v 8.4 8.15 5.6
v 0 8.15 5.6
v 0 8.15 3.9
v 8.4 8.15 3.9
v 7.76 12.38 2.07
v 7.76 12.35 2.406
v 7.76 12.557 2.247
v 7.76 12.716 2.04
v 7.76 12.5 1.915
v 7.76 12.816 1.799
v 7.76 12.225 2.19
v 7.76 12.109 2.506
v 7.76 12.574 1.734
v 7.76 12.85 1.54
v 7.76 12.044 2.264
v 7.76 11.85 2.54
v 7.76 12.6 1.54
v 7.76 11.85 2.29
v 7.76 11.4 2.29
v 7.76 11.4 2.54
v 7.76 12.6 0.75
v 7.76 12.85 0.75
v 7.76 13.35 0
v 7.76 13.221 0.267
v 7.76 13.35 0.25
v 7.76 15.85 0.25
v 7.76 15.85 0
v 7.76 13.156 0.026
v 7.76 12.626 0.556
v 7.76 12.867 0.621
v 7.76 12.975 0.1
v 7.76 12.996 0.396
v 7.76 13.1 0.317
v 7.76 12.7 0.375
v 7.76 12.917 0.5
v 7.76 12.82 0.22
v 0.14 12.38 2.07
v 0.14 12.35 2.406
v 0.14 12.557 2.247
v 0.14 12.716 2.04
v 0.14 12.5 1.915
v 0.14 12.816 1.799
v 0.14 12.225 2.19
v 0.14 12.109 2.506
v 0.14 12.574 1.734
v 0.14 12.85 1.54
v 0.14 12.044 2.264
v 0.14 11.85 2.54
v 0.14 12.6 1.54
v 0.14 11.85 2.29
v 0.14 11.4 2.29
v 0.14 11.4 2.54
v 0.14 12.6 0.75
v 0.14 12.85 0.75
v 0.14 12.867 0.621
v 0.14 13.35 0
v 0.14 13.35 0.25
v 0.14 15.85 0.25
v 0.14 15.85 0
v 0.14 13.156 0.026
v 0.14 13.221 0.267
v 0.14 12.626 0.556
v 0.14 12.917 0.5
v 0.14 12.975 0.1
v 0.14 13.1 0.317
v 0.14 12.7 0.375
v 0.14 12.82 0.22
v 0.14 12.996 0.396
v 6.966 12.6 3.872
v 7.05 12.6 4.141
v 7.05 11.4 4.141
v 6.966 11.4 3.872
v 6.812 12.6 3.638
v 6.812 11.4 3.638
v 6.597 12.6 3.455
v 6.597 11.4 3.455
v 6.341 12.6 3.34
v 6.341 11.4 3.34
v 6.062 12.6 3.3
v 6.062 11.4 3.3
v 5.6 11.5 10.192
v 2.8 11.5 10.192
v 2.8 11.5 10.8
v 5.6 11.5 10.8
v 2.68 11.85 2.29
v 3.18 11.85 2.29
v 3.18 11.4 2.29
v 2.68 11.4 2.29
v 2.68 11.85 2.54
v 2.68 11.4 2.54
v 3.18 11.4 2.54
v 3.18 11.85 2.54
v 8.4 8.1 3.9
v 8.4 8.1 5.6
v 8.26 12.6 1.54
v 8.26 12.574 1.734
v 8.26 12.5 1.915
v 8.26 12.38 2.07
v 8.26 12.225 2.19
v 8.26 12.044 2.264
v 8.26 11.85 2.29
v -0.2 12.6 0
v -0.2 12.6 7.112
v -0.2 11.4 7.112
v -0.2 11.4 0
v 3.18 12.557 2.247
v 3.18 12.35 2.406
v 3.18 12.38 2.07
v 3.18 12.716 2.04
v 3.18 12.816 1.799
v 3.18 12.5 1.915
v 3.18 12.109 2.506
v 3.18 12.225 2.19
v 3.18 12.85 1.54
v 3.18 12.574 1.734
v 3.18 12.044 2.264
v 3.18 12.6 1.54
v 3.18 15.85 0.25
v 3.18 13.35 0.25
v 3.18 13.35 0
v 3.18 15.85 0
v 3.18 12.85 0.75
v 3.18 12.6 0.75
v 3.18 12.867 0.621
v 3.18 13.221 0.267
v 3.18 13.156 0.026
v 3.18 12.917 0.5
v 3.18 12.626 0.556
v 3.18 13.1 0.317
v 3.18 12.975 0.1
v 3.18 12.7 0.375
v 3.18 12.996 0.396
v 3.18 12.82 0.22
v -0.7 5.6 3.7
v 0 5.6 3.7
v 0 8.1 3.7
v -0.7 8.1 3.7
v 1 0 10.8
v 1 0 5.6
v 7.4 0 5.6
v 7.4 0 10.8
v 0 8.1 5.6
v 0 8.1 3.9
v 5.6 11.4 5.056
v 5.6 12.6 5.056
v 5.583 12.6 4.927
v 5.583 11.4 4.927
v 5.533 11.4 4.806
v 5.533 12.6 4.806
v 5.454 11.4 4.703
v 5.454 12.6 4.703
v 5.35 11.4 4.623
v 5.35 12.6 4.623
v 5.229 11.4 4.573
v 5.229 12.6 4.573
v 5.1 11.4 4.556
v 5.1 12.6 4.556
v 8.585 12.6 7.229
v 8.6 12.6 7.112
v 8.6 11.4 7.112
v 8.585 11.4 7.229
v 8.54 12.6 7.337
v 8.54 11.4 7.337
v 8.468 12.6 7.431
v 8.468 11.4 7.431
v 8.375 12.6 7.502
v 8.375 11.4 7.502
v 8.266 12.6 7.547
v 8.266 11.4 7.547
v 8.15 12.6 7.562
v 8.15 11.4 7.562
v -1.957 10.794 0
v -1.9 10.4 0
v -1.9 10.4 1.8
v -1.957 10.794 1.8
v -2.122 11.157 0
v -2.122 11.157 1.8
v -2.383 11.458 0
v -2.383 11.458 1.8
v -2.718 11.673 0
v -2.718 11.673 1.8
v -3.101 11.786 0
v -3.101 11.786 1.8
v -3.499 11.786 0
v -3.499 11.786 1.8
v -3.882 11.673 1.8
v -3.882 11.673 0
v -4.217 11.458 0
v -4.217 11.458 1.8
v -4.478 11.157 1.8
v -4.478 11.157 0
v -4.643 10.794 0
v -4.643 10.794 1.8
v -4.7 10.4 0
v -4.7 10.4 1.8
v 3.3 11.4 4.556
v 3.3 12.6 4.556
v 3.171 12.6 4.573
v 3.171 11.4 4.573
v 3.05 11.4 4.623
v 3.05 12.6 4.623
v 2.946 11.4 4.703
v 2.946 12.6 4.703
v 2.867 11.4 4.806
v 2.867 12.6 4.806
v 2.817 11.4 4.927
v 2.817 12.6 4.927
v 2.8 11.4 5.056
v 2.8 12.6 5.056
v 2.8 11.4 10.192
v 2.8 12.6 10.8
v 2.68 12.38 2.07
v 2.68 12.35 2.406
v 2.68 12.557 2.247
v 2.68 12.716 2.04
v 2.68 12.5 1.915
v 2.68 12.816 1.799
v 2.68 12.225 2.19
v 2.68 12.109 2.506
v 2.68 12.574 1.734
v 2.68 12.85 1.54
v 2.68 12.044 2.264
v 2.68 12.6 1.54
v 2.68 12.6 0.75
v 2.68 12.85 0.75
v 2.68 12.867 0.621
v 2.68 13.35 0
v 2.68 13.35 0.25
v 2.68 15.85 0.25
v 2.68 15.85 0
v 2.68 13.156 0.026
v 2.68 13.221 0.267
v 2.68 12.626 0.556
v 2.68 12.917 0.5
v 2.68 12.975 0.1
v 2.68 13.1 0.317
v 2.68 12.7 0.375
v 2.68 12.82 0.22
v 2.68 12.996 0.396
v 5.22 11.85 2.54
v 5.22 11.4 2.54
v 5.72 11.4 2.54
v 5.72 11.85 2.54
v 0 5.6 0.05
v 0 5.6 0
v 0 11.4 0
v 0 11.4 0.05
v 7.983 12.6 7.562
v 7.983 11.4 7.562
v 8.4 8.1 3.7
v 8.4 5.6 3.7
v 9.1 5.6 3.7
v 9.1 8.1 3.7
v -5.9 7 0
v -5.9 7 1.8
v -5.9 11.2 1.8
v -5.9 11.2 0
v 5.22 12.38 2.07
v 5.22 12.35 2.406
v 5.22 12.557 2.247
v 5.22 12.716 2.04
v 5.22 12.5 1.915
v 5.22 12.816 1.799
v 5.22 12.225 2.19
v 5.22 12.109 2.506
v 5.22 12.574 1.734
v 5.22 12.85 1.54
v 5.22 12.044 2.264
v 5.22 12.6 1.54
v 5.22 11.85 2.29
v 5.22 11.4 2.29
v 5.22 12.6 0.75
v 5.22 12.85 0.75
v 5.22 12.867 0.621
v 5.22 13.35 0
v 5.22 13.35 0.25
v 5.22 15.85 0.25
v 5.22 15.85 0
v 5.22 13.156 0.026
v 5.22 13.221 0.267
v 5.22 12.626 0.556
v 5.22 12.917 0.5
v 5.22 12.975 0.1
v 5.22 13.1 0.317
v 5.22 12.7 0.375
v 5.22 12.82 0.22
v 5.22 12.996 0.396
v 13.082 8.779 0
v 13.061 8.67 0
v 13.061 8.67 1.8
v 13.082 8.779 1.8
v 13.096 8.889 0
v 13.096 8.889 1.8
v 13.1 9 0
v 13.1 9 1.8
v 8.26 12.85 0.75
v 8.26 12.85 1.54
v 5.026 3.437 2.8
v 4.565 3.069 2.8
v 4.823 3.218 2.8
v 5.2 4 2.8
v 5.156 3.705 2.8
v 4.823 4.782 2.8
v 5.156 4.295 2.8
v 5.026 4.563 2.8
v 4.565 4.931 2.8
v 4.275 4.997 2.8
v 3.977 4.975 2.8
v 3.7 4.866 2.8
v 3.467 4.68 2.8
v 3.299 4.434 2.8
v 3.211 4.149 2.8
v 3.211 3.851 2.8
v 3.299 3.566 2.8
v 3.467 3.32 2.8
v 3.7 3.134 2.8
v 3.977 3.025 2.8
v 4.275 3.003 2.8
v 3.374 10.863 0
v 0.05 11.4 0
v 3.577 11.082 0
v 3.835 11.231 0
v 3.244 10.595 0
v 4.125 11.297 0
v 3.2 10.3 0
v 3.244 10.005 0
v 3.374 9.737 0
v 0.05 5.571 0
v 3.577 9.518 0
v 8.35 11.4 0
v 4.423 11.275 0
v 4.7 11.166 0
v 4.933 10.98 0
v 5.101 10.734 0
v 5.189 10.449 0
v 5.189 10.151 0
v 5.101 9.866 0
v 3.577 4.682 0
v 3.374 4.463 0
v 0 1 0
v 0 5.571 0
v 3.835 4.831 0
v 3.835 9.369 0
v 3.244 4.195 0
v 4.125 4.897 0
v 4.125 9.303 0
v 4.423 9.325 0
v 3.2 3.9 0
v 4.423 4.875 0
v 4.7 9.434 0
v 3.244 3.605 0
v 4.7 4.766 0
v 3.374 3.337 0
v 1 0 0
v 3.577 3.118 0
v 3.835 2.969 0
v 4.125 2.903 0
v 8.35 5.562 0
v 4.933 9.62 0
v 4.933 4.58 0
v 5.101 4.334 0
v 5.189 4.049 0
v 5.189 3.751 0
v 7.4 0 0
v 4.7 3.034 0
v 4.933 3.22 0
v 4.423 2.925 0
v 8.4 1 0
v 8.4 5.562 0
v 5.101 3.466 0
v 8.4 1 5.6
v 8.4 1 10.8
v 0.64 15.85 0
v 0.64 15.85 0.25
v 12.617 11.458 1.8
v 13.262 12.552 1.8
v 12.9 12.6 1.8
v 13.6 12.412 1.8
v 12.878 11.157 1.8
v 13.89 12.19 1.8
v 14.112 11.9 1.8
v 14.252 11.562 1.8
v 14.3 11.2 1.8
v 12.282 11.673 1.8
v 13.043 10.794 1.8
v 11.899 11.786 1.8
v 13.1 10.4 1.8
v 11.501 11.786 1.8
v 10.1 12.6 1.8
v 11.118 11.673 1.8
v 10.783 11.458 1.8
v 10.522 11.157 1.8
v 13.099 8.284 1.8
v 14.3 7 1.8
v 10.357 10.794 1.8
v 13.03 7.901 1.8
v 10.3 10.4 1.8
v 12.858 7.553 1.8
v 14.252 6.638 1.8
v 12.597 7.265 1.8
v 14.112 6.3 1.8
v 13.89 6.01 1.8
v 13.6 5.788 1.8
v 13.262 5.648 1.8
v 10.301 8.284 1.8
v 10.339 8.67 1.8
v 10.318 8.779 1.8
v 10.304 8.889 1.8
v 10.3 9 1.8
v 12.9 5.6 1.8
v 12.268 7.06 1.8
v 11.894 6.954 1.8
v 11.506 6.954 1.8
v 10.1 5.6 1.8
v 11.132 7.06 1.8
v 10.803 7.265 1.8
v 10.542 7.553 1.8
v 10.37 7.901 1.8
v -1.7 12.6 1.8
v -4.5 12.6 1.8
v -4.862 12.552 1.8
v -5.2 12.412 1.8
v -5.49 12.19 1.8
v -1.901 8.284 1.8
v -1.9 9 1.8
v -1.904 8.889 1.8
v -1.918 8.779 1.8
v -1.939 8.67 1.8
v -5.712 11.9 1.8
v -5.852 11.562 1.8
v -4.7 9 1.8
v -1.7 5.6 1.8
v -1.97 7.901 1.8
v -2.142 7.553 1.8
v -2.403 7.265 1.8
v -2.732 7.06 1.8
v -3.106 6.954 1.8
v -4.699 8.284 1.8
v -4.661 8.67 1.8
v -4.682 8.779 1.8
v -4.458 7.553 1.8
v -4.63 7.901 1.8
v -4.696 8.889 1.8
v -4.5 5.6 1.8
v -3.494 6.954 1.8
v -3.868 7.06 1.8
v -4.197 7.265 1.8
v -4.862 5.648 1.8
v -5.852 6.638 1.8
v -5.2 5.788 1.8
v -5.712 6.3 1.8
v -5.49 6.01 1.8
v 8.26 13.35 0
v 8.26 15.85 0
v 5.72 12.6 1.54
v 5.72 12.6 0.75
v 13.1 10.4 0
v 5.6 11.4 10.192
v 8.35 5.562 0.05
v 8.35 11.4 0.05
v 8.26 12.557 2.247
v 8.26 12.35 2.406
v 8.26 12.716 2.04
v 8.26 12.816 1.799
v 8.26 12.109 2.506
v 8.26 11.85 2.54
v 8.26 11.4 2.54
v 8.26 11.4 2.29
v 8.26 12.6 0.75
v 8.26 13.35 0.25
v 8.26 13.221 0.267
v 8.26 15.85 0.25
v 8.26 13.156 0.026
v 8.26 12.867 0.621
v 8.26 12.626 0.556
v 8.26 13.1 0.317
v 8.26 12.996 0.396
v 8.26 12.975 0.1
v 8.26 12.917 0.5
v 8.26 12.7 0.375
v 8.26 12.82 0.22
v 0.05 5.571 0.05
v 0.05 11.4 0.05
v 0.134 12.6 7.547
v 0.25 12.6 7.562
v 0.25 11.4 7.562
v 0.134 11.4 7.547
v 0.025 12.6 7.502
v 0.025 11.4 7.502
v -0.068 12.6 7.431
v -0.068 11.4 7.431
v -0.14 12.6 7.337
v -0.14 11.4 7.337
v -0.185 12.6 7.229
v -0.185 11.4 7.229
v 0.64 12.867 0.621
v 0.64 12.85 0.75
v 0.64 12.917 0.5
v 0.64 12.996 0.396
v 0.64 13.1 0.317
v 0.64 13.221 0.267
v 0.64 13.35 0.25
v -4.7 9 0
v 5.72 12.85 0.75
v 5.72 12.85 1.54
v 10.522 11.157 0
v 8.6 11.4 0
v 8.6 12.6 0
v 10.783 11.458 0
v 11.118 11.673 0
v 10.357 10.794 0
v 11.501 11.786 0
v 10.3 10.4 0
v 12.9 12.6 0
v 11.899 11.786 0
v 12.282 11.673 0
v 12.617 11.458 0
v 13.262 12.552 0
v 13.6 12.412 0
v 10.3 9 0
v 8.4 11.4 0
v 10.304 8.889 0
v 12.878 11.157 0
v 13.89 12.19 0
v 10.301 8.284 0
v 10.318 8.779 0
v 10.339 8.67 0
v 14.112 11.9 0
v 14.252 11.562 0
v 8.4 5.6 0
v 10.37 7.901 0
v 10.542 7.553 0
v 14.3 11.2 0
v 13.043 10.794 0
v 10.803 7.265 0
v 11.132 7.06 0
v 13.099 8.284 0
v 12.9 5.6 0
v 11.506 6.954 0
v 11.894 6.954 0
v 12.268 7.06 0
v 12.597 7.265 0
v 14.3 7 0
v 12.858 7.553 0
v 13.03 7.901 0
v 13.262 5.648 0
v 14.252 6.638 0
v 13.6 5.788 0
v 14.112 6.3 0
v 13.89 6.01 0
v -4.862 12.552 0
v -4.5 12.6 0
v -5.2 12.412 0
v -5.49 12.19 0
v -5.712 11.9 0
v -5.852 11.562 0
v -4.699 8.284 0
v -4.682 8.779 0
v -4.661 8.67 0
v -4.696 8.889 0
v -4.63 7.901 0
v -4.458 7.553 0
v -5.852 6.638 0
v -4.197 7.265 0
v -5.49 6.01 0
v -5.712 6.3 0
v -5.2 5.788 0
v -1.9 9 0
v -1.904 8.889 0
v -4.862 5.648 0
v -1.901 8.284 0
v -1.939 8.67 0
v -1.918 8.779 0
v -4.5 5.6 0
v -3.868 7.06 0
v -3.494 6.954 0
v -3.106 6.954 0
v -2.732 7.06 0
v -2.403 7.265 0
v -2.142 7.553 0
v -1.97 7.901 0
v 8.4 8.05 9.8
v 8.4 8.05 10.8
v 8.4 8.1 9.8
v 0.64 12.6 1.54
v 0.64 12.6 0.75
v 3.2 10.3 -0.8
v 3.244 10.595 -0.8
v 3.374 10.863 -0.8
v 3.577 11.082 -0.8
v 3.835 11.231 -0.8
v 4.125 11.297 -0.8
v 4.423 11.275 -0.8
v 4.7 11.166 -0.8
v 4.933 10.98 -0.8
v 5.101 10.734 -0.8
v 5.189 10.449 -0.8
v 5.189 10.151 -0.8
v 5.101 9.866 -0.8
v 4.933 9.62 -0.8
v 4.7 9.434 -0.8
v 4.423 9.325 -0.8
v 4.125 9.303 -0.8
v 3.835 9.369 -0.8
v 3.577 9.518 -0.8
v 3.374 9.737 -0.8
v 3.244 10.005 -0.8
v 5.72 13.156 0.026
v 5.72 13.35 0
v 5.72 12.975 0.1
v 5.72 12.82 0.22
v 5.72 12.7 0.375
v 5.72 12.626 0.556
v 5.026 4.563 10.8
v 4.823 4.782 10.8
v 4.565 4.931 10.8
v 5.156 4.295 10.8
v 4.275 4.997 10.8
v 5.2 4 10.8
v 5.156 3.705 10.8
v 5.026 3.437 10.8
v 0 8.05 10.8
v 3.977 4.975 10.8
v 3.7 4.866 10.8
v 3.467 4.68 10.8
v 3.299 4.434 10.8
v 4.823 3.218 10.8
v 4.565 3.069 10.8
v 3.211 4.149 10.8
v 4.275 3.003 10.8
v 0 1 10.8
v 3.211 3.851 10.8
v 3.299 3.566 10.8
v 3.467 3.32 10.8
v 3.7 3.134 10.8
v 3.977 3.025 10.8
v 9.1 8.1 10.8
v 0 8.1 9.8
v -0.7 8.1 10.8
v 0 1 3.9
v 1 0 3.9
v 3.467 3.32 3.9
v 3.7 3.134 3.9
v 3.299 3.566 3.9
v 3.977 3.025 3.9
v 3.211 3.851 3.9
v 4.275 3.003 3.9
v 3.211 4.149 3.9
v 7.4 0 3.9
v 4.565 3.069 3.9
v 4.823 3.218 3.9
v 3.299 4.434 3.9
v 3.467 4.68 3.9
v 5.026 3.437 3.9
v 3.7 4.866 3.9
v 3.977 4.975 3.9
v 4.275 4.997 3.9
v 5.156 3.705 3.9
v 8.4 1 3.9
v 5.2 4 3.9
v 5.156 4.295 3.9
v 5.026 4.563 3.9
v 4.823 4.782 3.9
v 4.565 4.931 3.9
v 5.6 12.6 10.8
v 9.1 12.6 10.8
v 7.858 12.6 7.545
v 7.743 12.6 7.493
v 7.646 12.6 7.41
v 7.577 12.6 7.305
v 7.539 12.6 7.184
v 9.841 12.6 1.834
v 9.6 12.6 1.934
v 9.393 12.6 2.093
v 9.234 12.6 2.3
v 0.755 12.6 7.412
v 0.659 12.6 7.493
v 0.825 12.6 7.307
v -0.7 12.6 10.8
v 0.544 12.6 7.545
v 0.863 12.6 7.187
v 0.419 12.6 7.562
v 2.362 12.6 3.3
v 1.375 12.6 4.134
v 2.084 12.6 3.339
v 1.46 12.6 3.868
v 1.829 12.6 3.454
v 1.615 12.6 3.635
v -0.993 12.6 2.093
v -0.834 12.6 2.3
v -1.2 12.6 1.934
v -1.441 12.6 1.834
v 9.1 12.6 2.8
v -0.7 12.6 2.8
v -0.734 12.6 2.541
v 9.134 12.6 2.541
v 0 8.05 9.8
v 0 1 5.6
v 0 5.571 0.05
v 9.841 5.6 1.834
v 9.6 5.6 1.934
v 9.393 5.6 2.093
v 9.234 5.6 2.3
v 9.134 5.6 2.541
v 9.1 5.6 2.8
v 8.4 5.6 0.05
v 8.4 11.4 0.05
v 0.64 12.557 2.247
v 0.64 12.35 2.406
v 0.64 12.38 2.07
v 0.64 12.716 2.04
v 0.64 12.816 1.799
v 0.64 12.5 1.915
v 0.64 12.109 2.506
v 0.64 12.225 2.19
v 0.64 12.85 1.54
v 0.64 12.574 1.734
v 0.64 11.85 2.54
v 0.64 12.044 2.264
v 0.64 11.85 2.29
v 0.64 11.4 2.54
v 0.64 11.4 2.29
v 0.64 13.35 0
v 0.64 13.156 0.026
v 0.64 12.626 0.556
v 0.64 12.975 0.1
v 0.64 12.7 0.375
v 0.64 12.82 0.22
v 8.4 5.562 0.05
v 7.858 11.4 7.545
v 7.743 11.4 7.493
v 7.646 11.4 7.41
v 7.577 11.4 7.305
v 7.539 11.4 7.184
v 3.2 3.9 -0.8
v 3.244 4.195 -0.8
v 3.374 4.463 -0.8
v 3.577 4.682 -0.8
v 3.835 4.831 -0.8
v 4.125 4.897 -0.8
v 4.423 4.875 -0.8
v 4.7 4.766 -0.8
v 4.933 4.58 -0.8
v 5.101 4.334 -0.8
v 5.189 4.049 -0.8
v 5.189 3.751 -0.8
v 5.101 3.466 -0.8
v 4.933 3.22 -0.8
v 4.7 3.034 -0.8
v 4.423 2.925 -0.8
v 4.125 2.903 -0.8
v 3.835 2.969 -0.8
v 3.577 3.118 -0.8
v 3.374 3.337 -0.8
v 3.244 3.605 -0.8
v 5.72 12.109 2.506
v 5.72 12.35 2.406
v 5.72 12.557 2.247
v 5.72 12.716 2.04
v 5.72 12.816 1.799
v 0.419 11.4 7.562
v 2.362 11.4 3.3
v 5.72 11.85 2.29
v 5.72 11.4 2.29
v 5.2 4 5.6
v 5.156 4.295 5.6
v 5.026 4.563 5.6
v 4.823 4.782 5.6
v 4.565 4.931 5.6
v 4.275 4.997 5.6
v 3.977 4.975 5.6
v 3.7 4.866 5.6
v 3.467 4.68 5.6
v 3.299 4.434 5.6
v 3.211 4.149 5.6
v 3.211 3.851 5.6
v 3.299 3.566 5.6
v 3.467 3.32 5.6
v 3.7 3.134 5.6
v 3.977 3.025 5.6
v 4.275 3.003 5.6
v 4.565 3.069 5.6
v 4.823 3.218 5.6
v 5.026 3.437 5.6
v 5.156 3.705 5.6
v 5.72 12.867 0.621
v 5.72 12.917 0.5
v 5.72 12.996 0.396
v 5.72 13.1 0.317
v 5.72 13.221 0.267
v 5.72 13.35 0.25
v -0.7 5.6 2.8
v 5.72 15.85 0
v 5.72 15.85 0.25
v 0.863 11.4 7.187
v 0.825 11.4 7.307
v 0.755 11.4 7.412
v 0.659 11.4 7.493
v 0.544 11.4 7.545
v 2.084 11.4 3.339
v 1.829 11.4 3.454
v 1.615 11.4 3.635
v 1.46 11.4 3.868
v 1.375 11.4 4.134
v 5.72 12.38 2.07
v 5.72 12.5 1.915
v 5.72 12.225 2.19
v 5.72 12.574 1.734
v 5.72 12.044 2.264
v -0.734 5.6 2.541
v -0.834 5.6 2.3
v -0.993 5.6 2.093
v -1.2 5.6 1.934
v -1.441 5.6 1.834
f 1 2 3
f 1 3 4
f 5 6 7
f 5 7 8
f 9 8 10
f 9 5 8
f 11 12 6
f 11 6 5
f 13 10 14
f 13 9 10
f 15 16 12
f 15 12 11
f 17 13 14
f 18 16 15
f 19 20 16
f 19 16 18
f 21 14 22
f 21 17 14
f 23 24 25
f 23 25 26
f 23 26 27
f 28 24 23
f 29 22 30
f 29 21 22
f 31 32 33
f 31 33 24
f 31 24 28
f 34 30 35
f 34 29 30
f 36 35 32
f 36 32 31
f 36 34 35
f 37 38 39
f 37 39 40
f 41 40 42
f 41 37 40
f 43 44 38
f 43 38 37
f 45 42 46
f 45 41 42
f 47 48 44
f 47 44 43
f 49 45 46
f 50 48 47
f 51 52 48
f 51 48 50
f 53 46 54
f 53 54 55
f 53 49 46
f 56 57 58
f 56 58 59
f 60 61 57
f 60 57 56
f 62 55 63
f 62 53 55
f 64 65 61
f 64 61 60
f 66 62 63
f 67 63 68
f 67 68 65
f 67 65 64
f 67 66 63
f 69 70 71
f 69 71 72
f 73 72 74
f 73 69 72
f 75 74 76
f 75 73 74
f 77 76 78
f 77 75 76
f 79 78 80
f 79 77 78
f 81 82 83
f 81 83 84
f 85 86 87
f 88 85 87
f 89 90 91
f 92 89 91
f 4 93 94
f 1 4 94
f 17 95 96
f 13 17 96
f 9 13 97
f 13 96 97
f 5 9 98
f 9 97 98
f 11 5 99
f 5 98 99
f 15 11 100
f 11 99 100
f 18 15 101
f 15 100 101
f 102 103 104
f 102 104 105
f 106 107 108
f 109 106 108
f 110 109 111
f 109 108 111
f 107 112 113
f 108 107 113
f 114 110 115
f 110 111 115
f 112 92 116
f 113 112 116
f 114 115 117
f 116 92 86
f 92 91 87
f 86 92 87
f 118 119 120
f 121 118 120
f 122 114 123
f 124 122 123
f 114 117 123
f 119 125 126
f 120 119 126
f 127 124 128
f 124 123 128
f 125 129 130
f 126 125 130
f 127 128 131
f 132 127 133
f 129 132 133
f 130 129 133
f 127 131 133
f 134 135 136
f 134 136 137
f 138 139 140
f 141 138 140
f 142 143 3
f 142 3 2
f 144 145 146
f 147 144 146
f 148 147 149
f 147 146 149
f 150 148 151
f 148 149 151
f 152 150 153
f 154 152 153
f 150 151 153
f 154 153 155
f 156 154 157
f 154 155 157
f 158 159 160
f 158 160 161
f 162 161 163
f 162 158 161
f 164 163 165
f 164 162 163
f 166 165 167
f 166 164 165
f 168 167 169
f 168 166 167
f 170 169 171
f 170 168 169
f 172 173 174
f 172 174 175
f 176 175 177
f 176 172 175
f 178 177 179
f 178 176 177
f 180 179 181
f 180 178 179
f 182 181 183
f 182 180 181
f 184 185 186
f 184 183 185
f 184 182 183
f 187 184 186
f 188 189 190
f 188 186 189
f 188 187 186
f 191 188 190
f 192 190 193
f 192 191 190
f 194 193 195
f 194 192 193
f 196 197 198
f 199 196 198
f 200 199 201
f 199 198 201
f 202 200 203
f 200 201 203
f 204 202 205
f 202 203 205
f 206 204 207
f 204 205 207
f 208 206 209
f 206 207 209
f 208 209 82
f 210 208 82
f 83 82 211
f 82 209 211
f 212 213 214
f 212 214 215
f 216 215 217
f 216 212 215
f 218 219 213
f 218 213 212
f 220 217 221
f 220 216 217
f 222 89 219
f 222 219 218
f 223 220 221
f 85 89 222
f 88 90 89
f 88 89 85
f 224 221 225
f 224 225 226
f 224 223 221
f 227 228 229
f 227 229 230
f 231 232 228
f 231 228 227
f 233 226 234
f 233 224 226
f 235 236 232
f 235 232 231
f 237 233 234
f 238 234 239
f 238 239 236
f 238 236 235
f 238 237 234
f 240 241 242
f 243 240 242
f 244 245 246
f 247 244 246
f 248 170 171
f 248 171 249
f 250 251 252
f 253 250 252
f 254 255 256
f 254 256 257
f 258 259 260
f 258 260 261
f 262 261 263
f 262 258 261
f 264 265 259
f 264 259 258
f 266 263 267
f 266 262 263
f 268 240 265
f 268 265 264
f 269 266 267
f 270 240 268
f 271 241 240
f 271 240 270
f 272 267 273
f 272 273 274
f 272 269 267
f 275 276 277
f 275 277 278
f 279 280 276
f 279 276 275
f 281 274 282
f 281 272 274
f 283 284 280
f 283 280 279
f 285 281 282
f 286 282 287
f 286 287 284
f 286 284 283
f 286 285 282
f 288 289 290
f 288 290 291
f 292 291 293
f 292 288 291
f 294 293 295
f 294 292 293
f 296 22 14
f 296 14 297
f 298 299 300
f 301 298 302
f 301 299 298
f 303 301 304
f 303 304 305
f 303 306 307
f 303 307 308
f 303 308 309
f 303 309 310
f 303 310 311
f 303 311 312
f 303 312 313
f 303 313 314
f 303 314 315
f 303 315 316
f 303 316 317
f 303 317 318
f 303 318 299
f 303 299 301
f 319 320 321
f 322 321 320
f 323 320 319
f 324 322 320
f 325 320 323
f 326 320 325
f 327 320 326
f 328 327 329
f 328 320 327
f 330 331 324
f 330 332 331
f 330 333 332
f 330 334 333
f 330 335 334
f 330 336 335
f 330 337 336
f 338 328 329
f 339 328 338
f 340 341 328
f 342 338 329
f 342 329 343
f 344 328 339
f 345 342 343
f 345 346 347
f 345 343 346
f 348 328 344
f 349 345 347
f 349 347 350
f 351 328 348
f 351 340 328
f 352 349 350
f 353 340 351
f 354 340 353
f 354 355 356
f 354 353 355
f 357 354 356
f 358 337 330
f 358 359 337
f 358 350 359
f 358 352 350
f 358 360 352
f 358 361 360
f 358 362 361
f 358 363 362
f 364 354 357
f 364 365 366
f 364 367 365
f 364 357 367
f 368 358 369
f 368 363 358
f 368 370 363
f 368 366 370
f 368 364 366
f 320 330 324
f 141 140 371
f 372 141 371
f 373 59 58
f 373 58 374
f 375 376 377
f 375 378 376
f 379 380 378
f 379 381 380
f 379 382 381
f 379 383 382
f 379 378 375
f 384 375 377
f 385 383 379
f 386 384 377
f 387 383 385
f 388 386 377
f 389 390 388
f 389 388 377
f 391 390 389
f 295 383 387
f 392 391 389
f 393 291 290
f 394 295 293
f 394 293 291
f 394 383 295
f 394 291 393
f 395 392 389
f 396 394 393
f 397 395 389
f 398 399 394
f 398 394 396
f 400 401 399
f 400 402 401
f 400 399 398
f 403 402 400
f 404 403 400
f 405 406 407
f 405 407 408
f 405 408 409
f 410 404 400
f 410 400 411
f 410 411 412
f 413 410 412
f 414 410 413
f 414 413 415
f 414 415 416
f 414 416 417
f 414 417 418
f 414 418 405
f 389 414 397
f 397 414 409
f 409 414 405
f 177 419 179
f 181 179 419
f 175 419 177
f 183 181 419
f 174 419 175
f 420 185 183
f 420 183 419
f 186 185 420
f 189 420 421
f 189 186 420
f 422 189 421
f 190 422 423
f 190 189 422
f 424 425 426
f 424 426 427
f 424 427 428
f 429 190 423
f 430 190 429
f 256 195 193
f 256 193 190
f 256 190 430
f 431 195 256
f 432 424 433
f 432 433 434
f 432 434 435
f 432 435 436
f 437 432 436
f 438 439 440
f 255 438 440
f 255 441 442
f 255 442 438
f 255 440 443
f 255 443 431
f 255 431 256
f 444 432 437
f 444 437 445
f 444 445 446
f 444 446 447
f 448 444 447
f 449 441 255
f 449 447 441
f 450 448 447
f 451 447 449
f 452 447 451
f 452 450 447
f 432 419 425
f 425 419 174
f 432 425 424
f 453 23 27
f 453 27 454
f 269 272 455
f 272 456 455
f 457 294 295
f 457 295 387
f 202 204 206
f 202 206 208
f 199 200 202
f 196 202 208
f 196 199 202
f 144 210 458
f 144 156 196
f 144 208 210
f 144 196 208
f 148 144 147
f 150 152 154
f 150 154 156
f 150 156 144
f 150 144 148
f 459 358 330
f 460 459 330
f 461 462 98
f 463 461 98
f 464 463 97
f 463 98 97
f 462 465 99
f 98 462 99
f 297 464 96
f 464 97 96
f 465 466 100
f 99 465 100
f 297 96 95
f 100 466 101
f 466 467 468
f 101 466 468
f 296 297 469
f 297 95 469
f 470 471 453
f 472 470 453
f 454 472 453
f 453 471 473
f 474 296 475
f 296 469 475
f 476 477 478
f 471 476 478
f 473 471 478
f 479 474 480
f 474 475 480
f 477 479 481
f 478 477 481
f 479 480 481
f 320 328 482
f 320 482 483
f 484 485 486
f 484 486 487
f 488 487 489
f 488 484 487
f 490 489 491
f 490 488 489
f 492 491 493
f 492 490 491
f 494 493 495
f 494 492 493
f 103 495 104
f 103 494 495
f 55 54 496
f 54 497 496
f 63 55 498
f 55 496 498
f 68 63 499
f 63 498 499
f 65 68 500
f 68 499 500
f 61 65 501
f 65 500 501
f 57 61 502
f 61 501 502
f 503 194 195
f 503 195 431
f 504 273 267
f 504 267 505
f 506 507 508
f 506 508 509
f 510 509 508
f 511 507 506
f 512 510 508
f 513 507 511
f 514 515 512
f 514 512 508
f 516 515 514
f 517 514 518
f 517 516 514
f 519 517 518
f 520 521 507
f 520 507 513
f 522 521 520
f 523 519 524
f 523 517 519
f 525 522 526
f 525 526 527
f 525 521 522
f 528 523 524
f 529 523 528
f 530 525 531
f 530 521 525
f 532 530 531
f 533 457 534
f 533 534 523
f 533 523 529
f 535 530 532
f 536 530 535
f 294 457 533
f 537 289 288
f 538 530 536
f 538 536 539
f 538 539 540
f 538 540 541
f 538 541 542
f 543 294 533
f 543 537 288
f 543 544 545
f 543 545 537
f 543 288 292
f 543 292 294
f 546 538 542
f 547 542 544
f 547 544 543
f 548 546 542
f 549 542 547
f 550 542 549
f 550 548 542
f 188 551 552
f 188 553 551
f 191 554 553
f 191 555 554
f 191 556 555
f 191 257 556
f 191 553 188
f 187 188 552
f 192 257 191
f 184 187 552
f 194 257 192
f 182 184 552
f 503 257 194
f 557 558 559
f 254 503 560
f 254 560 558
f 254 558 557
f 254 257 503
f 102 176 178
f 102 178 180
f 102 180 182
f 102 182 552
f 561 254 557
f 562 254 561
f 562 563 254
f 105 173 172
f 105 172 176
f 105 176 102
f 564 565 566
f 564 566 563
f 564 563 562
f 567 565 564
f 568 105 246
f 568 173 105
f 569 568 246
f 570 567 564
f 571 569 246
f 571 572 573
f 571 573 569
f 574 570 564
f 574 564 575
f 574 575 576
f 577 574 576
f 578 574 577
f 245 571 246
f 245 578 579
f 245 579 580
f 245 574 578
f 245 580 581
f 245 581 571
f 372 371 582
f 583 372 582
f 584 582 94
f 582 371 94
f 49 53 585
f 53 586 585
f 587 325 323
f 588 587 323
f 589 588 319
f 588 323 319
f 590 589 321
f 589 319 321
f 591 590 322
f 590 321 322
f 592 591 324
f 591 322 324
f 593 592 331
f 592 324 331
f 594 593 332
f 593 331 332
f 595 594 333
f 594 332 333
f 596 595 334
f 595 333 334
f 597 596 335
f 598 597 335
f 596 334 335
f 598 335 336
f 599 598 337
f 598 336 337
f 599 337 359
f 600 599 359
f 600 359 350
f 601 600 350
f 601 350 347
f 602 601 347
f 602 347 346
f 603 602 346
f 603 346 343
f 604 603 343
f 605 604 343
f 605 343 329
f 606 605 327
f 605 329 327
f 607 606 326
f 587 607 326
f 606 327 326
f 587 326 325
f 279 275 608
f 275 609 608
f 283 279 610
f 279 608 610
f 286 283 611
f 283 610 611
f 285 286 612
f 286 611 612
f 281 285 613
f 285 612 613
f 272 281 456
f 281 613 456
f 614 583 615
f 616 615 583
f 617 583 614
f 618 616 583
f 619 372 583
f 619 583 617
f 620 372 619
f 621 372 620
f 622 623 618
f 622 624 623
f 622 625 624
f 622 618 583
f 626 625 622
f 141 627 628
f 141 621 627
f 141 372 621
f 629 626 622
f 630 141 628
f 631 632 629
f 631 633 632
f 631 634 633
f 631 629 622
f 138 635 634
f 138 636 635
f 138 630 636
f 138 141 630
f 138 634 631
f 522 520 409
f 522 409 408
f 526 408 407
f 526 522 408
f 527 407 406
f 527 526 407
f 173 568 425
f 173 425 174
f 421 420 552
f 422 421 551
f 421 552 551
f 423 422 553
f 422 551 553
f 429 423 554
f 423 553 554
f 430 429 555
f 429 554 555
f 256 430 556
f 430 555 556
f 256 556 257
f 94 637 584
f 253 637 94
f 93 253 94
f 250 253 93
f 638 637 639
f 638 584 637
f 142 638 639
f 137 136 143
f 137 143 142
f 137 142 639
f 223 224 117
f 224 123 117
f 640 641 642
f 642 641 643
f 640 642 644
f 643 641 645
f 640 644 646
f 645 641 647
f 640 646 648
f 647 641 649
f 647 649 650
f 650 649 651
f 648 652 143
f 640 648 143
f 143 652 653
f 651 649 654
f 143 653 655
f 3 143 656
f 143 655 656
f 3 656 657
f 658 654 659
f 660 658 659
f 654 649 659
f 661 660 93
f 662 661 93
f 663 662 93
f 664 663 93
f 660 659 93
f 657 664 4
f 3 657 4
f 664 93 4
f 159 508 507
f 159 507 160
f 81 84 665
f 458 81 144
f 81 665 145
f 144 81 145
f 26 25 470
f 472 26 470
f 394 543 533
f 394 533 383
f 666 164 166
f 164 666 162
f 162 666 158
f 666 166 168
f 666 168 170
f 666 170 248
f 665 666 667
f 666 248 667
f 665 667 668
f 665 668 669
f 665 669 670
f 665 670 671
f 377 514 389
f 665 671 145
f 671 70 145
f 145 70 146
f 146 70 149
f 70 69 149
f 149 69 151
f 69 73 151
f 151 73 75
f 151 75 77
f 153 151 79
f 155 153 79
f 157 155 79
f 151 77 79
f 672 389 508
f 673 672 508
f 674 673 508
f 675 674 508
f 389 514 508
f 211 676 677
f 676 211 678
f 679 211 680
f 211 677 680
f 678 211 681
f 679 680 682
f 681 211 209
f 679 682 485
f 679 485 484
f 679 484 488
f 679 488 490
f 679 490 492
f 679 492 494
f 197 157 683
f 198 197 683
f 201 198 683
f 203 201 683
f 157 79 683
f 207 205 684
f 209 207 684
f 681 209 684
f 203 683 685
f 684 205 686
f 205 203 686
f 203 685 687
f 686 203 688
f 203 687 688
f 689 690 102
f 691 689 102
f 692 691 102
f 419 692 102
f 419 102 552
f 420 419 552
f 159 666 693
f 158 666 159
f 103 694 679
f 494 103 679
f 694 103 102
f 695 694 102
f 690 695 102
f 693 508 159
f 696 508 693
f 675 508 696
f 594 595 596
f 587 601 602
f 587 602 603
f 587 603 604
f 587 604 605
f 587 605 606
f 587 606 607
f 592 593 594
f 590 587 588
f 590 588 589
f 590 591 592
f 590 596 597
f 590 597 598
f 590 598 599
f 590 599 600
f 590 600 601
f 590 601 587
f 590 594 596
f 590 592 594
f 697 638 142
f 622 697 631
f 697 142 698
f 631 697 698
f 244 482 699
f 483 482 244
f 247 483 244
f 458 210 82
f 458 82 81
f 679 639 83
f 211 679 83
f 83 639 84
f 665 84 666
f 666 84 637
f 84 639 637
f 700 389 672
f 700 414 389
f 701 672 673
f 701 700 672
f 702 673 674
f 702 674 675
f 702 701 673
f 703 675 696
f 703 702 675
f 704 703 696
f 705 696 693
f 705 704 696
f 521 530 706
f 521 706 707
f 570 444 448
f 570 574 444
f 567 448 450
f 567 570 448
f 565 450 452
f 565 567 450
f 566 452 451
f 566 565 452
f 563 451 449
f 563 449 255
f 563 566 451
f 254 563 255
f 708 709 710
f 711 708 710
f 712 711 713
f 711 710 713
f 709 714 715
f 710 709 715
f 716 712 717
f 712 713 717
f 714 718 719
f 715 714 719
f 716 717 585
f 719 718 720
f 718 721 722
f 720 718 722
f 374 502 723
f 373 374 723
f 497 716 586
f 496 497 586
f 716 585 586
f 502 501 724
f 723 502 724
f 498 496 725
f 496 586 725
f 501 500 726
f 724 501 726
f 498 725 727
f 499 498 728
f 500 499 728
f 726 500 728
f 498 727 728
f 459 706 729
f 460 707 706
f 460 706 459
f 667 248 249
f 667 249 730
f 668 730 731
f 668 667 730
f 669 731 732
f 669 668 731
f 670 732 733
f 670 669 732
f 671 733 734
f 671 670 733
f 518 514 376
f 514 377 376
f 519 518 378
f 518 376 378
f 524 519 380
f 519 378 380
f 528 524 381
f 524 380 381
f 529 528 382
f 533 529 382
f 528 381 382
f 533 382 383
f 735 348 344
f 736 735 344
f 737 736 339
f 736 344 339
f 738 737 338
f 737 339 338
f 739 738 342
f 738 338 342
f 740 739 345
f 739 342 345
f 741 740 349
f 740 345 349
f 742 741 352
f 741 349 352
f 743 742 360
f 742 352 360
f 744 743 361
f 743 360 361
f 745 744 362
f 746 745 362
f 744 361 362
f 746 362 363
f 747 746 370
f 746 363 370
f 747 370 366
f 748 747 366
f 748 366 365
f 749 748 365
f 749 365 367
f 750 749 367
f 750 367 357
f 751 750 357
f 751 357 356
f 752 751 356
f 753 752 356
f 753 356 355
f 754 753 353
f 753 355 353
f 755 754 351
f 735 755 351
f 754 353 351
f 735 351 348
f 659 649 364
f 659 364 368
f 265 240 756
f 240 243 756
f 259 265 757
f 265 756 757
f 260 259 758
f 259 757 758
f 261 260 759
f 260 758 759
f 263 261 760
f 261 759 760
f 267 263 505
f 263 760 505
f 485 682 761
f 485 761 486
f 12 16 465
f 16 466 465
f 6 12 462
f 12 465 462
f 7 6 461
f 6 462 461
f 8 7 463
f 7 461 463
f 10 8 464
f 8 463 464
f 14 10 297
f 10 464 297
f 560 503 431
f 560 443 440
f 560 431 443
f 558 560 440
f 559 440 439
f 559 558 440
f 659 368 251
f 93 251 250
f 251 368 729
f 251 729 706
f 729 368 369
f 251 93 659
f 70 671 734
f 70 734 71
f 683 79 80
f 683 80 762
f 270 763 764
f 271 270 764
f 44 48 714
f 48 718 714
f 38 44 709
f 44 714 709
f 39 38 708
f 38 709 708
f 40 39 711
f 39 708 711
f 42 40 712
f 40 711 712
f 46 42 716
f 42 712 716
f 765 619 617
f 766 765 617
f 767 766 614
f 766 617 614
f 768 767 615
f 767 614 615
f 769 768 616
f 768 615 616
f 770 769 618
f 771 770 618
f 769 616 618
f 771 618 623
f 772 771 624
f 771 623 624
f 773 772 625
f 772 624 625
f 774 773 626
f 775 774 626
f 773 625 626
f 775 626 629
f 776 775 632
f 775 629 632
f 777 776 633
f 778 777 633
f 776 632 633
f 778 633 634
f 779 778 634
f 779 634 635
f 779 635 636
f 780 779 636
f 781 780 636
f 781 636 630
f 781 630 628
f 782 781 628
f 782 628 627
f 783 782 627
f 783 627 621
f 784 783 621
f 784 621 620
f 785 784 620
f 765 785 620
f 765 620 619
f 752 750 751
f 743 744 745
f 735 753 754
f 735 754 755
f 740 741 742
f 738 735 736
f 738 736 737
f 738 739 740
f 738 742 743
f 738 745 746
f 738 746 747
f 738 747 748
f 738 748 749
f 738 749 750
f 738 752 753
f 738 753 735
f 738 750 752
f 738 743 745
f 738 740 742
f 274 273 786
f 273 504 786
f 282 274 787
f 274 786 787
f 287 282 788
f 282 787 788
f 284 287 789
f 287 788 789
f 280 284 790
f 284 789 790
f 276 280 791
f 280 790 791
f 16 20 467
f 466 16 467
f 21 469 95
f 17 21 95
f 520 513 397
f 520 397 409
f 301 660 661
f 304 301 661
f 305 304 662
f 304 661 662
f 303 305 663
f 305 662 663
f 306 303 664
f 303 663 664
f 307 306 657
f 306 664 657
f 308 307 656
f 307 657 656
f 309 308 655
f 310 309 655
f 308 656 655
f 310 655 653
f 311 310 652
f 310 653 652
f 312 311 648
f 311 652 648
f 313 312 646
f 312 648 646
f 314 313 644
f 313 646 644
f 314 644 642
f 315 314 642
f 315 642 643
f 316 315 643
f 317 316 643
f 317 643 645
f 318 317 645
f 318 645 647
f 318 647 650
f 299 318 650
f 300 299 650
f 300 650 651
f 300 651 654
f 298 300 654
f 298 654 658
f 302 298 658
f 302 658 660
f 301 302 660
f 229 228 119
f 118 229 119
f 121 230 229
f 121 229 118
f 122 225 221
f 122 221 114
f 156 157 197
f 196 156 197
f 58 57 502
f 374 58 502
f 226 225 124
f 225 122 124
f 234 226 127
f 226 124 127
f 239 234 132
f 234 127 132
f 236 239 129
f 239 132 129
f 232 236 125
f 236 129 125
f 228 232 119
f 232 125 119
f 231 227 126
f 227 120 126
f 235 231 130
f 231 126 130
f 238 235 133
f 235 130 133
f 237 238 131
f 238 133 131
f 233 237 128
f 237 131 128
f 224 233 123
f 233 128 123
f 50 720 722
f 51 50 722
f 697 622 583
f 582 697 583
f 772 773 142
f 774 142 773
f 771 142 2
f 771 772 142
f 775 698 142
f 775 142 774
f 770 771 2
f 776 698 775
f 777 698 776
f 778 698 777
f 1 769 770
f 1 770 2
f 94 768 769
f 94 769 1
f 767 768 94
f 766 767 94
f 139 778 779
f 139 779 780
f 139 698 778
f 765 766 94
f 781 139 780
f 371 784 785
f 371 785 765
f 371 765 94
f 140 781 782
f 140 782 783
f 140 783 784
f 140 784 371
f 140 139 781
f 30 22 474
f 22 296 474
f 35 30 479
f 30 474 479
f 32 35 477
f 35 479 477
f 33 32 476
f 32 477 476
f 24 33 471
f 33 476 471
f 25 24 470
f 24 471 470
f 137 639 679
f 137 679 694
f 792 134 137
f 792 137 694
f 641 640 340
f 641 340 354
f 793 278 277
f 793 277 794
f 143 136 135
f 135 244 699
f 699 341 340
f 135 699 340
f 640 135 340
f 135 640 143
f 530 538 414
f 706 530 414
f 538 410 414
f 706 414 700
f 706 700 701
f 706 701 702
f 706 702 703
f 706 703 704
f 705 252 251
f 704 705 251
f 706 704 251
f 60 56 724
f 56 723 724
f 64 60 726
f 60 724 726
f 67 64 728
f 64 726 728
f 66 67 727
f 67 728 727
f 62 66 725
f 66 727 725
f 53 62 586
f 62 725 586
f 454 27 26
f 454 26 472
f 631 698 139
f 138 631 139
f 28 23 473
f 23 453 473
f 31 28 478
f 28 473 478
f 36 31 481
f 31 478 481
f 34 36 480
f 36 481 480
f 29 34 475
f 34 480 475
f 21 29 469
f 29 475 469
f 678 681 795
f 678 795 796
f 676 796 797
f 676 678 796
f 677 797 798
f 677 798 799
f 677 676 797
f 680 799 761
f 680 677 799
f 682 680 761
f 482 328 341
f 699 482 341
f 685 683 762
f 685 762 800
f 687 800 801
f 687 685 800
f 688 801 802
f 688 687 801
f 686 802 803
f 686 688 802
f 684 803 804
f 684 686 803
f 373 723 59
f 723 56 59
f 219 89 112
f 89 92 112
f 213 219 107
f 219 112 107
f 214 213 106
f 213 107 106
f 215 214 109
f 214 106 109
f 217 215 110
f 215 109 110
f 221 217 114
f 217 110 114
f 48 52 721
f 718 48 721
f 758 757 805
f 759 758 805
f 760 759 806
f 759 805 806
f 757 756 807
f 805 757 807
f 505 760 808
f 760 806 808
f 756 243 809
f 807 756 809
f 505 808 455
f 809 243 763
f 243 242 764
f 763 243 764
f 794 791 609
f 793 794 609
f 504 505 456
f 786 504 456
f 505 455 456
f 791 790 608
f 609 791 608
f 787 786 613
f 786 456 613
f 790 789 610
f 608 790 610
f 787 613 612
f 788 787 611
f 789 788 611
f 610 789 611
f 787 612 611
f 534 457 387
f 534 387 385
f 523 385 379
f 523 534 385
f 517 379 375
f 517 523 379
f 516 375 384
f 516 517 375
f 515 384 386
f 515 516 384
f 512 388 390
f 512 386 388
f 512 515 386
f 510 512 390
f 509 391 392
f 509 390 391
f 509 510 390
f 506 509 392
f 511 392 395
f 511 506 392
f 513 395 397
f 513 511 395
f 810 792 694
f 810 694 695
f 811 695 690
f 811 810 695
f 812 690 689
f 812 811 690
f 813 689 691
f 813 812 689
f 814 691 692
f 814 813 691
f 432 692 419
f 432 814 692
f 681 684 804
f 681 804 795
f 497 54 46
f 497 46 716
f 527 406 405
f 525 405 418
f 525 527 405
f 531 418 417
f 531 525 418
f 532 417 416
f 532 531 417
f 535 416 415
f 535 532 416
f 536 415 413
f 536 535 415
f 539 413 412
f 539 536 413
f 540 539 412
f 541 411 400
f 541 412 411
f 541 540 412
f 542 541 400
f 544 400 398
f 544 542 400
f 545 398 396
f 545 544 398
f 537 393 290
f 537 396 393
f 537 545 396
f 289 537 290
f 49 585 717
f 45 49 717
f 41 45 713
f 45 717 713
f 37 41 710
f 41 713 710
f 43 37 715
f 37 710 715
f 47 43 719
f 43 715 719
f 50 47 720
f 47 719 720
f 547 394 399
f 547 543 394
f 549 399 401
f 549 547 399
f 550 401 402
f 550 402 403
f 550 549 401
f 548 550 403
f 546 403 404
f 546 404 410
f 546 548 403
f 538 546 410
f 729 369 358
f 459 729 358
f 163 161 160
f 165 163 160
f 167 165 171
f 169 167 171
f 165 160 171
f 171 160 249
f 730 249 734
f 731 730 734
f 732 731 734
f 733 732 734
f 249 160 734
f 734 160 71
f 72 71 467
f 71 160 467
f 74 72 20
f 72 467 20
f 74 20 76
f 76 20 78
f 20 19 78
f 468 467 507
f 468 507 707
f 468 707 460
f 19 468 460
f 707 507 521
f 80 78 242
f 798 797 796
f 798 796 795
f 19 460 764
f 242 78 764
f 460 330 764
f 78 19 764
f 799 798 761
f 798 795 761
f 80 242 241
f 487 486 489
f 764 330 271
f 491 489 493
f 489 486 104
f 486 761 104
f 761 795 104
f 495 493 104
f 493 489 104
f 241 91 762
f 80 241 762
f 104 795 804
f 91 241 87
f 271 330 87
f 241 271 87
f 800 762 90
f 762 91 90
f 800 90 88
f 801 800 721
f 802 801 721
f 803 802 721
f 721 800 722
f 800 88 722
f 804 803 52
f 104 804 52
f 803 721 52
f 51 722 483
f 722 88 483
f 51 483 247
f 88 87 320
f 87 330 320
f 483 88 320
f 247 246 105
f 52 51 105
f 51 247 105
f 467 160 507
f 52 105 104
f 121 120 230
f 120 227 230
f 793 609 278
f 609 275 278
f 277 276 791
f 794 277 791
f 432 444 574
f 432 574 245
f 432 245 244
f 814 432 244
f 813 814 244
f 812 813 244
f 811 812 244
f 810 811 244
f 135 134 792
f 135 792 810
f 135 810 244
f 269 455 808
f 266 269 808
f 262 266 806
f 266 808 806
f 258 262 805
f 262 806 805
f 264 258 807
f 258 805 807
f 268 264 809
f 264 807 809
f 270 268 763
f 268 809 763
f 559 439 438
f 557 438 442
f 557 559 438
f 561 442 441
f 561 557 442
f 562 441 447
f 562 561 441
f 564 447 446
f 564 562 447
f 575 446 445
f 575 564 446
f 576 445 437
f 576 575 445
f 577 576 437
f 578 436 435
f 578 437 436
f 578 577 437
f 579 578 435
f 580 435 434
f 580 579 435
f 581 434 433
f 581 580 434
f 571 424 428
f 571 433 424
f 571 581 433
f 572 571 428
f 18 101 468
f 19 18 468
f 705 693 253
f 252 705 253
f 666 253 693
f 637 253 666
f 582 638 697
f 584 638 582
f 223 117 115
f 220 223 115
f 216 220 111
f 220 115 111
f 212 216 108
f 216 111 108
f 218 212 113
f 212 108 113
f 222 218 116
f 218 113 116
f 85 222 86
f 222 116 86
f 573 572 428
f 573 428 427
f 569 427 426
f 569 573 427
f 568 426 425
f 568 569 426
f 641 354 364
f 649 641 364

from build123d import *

# Parameters (mm, degrees)
EXTRUDE_1_DEPTH      = 10.8
SKETCH_2_R           = 1
EXTRUDE_2_DEPTH      = 0.8
SKETCH_3_W           = 1.7
SKETCH_3_H           = 8.1
CUT_EXTRUDE_1_DEPTH  = 17.8
EXTRUDE_START        = -4.5
EXTRUDE_3_DEPTH      = 4.5
SKETCH_5_W           = 8.4
SKETCH_5_H           = 0.05
CUT_EXTRUDE_2_DEPTH  = 1
SKETCH_6_R           = 1
CUT_EXTRUDE_3_DEPTH  = 8
CUT_EXTRUDE_4_DEPTH  = 1.2
SKETCH_8_W           = 2.8
SKETCH_8_H           = 0.608363533
EXTRUDE_4_DEPTH      = 0.1
EXTRUDE_START_2      = 2.5
EXTRUDE_5_DEPTH      = 2.5
SKETCH_10_W          = 8.4
SKETCH_10_H          = 1.7
CUT_EXTRUDE_5_DEPTH  = 0.05
FILLET_1_R           = 1.4
SKETCH_11_W          = 0.05
SKETCH_11_H          = 5.83834946
SKETCH_11_H_2        = 5.828769054
CUT_EXTRUDE_8_DEPTH  = 0.05
CUT_EXTRUDE_9_DEPTH  = 4
SKETCH_13_W          = 0.5
SKETCH_13_H          = 5.54
EXTRUDE_6_DEPTH      = 1.45
FILLET_2_R           = 1
CUT_EXTRUDE_START    = -8.12
CUT_EXTRUDE_10_DEPTH = 8.12
SKETCH_15_W          = 3
SKETCH_15_H          = 0.25
CUT_EXTRUDE_11_DEPTH = 8.12
SKETCH_16_W          = 0.5
SKETCH_16_H          = 0.25
EXTRUDE_7_DEPTH      = 3
FILLET_3_R           = 0.5
FILLET_4_R           = 0.75


with BuildPart() as part:
    # Эскиз1 → Бобышка-Вытянуть1 (new body)
    with BuildSketch(Plane.XY):
        Polygon((7.4, 0), (8.4, 1), (8.4, 12.6), (0, 12.6), (0, 1), (1, 0), align=None)
    extrude(amount=EXTRUDE_1_DEPTH)

    # Эскиз2 → Бобышка-Вытянуть2 (add)
    with BuildSketch(Plane(origin=(0, 0, 0), x_dir=(-1, 0, 0), z_dir=(0, 0, -1))):
        with Locations((-4.2, 10.3)):
            Circle(SKETCH_2_R)
        with Locations((-4.2, 3.9)):
            Circle(SKETCH_2_R)
    extrude(amount=EXTRUDE_2_DEPTH)

    # Эскиз3 → Вырез-Вытянуть1 (cut)
    with BuildSketch(Plane(origin=(8.4, 0, 0), x_dir=(0, 0, -1), z_dir=(1, 0, 0))):
        with Locations((-4.75, 4.05)):
            Rectangle(SKETCH_3_W, SKETCH_3_H)
    extrude(amount=-CUT_EXTRUDE_1_DEPTH, mode=Mode.SUBTRACT)

    # Эскиз4 → Бобышка-Вытянуть3 (add)
    with BuildSketch(Plane(origin=(0, 12.6, 0), x_dir=(1, 0, 0), z_dir=(0, 1, 0)).offset(EXTRUDE_START)):
        with BuildLine():
            Line((9.1, -10.8), (-0.7, -10.8))
            Line((-0.7, -10.8), (-0.7, -2.8))
            ThreePointArc((-0.7, -2.8), (-0.992893219, -2.092893219), (-1.7, -1.8))
            Line((-1.7, -1.8), (-5.9, -1.8))
            Line((-5.9, -1.8), (-5.9, 0))
            Line((-5.9, 0), (14.3, 0))
            Line((14.3, 0), (14.3, -1.8))
            Line((14.3, -1.8), (10.1, -1.8))
            ThreePointArc((10.1, -1.8), (9.392893219, -2.092893219), (9.1, -2.8))
            Line((9.1, -2.8), (9.1, -10.8))
        make_face()
    extrude(amount=EXTRUDE_3_DEPTH)

    # Эскиз5 → Вырез-Вытянуть2 (cut)
    with BuildSketch(Plane.XY.offset(10.8)):
        with Locations((4.2, 8.075)):
            Rectangle(SKETCH_5_W, SKETCH_5_H)
    extrude(amount=-CUT_EXTRUDE_2_DEPTH, mode=Mode.SUBTRACT)

    # Эскиз6 → Вырез-Вытянуть3 (cut)
    with BuildSketch(Plane.XY.offset(10.8)):
        with Locations((4.2, 4)):
            Circle(SKETCH_6_R)
    extrude(amount=-CUT_EXTRUDE_3_DEPTH, mode=Mode.SUBTRACT)

    # Эскиз7 → Вырез-Вытянуть4 (cut)
    with BuildSketch(Plane(origin=(0, 12.6, 0), x_dir=(1, 0, 0), z_dir=(0, 1, 0))):
        with BuildLine():
            Line((8.6, 0), (8.6, -7.112411136))
            ThreePointArc((8.6, -7.112411136), (8.468198052, -7.430609188), (8.15, -7.562411136))
            Line((8.15, -7.562411136), (7.983405928, -7.562411136))
            ThreePointArc((7.983405928, -7.562411136), (7.691564003, -7.454943311), (7.539115931, -7.183870205))
            Line((7.539115931, -7.183870205), (7.049736844, -4.141202068))
            ThreePointArc((7.049736844, -4.141202068), (6.710963351, -3.53881739), (6.062425739, -3.3))
            Line((6.062425739, -3.3), (2.361664993, -3.3))
            ThreePointArc((2.361664993, -3.3), (1.71573807, -3.536600753), (1.37546474, -4.13444318))
            Line((1.37546474, -4.13444318), (0.863036378, -7.186911705))
            ThreePointArc((0.863036378, -7.186911705), (0.709913379, -7.455940797), (0.419246264, -7.562411136))
            Line((0.419246264, -7.562411136), (0.25, -7.562411136))
            ThreePointArc((0.25, -7.562411136), (-0.068198052, -7.430609188), (-0.2, -7.112411136))
            Line((-0.2, -7.112411136), (-0.2, 0))
            Line((-0.2, 0), (8.6, 0))
        make_face()
        with BuildLine():
            Line((4.2, -10.8), (5.6, -10.8))
            Line((5.6, -10.8), (5.6, -5.056380156))
            ThreePointArc((5.6, -5.056380156), (5.453553391, -4.702826765), (5.1, -4.556380156))
            Line((5.1, -4.556380156), (3.3, -4.556380156))
            ThreePointArc((3.3, -4.556380156), (2.946446609, -4.702826765), (2.8, -5.056380156))
            Line((2.8, -5.056380156), (2.8, -10.8))
            Line((2.8, -10.8), (4.2, -10.8))
        make_face()
    extrude(amount=-CUT_EXTRUDE_4_DEPTH, mode=Mode.SUBTRACT)

    # Эскиз8 → Бобышка-Вытянуть4 (add)
    with BuildSketch(Plane(origin=(0, 11.4, 0), x_dir=(1, 0, 0), z_dir=(0, 1, 0))):
        with Locations((4.2, -10.495818233)):
            Rectangle(SKETCH_8_W, SKETCH_8_H)
    extrude(amount=EXTRUDE_4_DEPTH)

    # Эскиз9 → Бобышка-Вытянуть5 (add)
    with BuildSketch(Plane.XZ.offset(-8.1).offset(EXTRUDE_START_2)):
        with BuildLine():
            Line((0, 0), (0, 3.7))
            Line((0, 3.7), (-0.7, 3.7))
            Line((-0.7, 3.7), (-0.7, 2.8))
            ThreePointArc((-0.7, 2.8), (-0.992893219, 2.092893219), (-1.7, 1.8))
            Line((-1.7, 1.8), (-5.9, 1.8))
            Line((-5.9, 1.8), (-5.9, 0))
            Line((-5.9, 0), (0, 0))
        make_face()
        with BuildLine():
            Line((14.3, 0), (8.4, 0))
            Line((8.4, 0), (8.4, 3.7))
            Line((8.4, 3.7), (9.1, 3.7))
            Line((9.1, 3.7), (9.1, 2.8))
            ThreePointArc((9.1, 2.8), (9.392893219, 2.092893219), (10.1, 1.8))
            Line((10.1, 1.8), (14.3, 1.8))
            Line((14.3, 1.8), (14.3, 0))
        make_face()
    extrude(amount=-EXTRUDE_5_DEPTH)

    # Эскиз10 → Вырез-Вытянуть5 (cut)
    with BuildSketch(Plane.XZ.offset(-8.1)):
        with Locations((4.2, 4.75)):
            Rectangle(SKETCH_10_W, SKETCH_10_H)
    extrude(amount=-CUT_EXTRUDE_5_DEPTH, mode=Mode.SUBTRACT)

    # Скругление1
    fillet_1_edges = [part.edges().sort_by_distance(p)[0] for p in [
        (-5.9, 5.6, 0.9),
        (14.3, 5.6, 0.9),
        (14.3, 12.6, 0.9),
        (-5.9, 12.6, 0.9),
    ]]
    fillet(fillet_1_edges, radius=FILLET_1_R)

    # Эскиз11 → Вырез-Вытянуть8 (cut)
    with BuildSketch(Plane(origin=(0, 0, 0), x_dir=(-1, 0, 0), z_dir=(0, 0, -1))):
        with Locations((-8.375, 8.48082527)):
            Rectangle(SKETCH_11_W, SKETCH_11_H)
        with Locations((-0.025, 8.485615473)):
            Rectangle(SKETCH_11_W, SKETCH_11_H_2)
    extrude(amount=-CUT_EXTRUDE_8_DEPTH, mode=Mode.SUBTRACT)

    # Эскиз12 → Вырез-Вытянуть9 (cut)
    with BuildSketch(Plane(origin=(0, 0, 0), x_dir=(-1, 0, 0), z_dir=(0, 0, -1))):
        with BuildLine():
            Line((1.9, 9), (1.9, 10.4))
            ThreePointArc((1.9, 10.4), (3.3, 11.8), (4.7, 10.4))
            Line((4.7, 10.4), (4.7, 9))
            ThreePointArc((4.7, 9), (4.690102856, 8.833825246), (4.660551359, 8.67))
            ThreePointArc((4.660551359, 8.67), (3.3, 6.94), (1.939448641, 8.67))
            ThreePointArc((1.939448641, 8.67), (1.909897144, 8.833825246), (1.9, 9))
        make_face()
        with BuildLine():
            Line((-10.3, 10.4), (-10.3, 9))
            ThreePointArc((-10.3, 9), (-10.309897144, 8.833825246), (-10.339448641, 8.67))
            ThreePointArc((-10.339448641, 8.67), (-11.7, 6.94), (-13.060551359, 8.67))
            ThreePointArc((-13.060551359, 8.67), (-13.090102856, 8.833825246), (-13.1, 9))
            Line((-13.1, 9), (-13.1, 10.4))
            ThreePointArc((-13.1, 10.4), (-11.7, 11.8), (-10.3, 10.4))
        make_face()
    extrude(amount=-CUT_EXTRUDE_9_DEPTH, mode=Mode.SUBTRACT)

    # Эскиз13 → Бобышка-Вытянуть6 (add)
    with BuildSketch(Plane(origin=(0, 11.4, 0), x_dir=(1, 0, 0), z_dir=(0, 1, 0))):
        with Locations((5.47, 0.23)):
            Rectangle(SKETCH_13_W, SKETCH_13_H)
        with Locations((8.01, 0.23)):
            Rectangle(SKETCH_13_W, SKETCH_13_H)
        with Locations((2.93, 0.23)):
            Rectangle(SKETCH_13_W, SKETCH_13_H)
        with Locations((0.39, 0.23)):
            Rectangle(SKETCH_13_W, SKETCH_13_H)
    extrude(amount=EXTRUDE_6_DEPTH)

    # Скругление2
    fillet_2_edges = [part.edges().sort_by_distance(p)[0] for p in [
        (5.47, 12.85, 2.54),
        (2.93, 12.85, 2.54),
        (0.39, 12.85, 2.54),
        (8.01, 12.85, 2.54),
    ]]
    fillet(fillet_2_edges, radius=FILLET_2_R)

    # Эскиз14 → Вырез-Вытянуть10 (cut)
    with BuildSketch(Plane.ZY.offset(-0.14).offset(CUT_EXTRUDE_START)):
        with BuildLine():
            Line((-3, 12.6), (1.54, 12.6))
            ThreePointArc((1.54, 12.6), (2.070330086, 12.380330086), (2.29, 11.85))
            Line((2.29, 11.85), (2.29, 11.4))
            Line((2.29, 11.4), (-3, 11.4))
            Line((-3, 11.4), (-3, 12.6))
        make_face()
    extrude(amount=CUT_EXTRUDE_10_DEPTH, mode=Mode.SUBTRACT)

    # Эскиз15 → Вырез-Вытянуть11 (cut)
    with BuildSketch(Plane(origin=(8.26, 0, 0), x_dir=(0, 0, -1), z_dir=(1, 0, 0)).offset(CUT_EXTRUDE_START)):
        with Locations((1.5, 12.725)):
            Rectangle(SKETCH_15_W, SKETCH_15_H)
    extrude(amount=CUT_EXTRUDE_11_DEPTH, mode=Mode.SUBTRACT)

    # Эскиз16 → Бобышка-Вытянуть7 (add)
    with BuildSketch(Plane(origin=(0, 12.85, 0), x_dir=(1, 0, 0), z_dir=(0, 1, 0))):
        with Locations((8.01, -0.125)):
            Rectangle(SKETCH_16_W, SKETCH_16_H)
        with Locations((5.47, -0.125)):
            Rectangle(SKETCH_16_W, SKETCH_16_H)
        with Locations((2.93, -0.125)):
            Rectangle(SKETCH_16_W, SKETCH_16_H)
        with Locations((0.39, -0.125)):
            Rectangle(SKETCH_16_W, SKETCH_16_H)
    extrude(amount=EXTRUDE_7_DEPTH)

    # Скругление3
    fillet_3_edges = [part.edges().sort_by_distance(p)[0] for p in [
        (8.01, 12.85, 0.25),
        (5.47, 12.85, 0.25),
        (2.93, 12.85, 0.25),
        (0.39, 12.85, 0.25),
    ]]
    fillet(fillet_3_edges, radius=FILLET_3_R)

    # Скругление4
    fillet_4_edges = [part.edges().sort_by_distance(p)[0] for p in [
        (5.47, 12.6, 0),
        (2.93, 12.6, 0),
        (0.39, 12.6, 0),
        (8.01, 12.6, 0),
    ]]
    fillet(fillet_4_edges, radius=FILLET_4_R)


solid = part.part
